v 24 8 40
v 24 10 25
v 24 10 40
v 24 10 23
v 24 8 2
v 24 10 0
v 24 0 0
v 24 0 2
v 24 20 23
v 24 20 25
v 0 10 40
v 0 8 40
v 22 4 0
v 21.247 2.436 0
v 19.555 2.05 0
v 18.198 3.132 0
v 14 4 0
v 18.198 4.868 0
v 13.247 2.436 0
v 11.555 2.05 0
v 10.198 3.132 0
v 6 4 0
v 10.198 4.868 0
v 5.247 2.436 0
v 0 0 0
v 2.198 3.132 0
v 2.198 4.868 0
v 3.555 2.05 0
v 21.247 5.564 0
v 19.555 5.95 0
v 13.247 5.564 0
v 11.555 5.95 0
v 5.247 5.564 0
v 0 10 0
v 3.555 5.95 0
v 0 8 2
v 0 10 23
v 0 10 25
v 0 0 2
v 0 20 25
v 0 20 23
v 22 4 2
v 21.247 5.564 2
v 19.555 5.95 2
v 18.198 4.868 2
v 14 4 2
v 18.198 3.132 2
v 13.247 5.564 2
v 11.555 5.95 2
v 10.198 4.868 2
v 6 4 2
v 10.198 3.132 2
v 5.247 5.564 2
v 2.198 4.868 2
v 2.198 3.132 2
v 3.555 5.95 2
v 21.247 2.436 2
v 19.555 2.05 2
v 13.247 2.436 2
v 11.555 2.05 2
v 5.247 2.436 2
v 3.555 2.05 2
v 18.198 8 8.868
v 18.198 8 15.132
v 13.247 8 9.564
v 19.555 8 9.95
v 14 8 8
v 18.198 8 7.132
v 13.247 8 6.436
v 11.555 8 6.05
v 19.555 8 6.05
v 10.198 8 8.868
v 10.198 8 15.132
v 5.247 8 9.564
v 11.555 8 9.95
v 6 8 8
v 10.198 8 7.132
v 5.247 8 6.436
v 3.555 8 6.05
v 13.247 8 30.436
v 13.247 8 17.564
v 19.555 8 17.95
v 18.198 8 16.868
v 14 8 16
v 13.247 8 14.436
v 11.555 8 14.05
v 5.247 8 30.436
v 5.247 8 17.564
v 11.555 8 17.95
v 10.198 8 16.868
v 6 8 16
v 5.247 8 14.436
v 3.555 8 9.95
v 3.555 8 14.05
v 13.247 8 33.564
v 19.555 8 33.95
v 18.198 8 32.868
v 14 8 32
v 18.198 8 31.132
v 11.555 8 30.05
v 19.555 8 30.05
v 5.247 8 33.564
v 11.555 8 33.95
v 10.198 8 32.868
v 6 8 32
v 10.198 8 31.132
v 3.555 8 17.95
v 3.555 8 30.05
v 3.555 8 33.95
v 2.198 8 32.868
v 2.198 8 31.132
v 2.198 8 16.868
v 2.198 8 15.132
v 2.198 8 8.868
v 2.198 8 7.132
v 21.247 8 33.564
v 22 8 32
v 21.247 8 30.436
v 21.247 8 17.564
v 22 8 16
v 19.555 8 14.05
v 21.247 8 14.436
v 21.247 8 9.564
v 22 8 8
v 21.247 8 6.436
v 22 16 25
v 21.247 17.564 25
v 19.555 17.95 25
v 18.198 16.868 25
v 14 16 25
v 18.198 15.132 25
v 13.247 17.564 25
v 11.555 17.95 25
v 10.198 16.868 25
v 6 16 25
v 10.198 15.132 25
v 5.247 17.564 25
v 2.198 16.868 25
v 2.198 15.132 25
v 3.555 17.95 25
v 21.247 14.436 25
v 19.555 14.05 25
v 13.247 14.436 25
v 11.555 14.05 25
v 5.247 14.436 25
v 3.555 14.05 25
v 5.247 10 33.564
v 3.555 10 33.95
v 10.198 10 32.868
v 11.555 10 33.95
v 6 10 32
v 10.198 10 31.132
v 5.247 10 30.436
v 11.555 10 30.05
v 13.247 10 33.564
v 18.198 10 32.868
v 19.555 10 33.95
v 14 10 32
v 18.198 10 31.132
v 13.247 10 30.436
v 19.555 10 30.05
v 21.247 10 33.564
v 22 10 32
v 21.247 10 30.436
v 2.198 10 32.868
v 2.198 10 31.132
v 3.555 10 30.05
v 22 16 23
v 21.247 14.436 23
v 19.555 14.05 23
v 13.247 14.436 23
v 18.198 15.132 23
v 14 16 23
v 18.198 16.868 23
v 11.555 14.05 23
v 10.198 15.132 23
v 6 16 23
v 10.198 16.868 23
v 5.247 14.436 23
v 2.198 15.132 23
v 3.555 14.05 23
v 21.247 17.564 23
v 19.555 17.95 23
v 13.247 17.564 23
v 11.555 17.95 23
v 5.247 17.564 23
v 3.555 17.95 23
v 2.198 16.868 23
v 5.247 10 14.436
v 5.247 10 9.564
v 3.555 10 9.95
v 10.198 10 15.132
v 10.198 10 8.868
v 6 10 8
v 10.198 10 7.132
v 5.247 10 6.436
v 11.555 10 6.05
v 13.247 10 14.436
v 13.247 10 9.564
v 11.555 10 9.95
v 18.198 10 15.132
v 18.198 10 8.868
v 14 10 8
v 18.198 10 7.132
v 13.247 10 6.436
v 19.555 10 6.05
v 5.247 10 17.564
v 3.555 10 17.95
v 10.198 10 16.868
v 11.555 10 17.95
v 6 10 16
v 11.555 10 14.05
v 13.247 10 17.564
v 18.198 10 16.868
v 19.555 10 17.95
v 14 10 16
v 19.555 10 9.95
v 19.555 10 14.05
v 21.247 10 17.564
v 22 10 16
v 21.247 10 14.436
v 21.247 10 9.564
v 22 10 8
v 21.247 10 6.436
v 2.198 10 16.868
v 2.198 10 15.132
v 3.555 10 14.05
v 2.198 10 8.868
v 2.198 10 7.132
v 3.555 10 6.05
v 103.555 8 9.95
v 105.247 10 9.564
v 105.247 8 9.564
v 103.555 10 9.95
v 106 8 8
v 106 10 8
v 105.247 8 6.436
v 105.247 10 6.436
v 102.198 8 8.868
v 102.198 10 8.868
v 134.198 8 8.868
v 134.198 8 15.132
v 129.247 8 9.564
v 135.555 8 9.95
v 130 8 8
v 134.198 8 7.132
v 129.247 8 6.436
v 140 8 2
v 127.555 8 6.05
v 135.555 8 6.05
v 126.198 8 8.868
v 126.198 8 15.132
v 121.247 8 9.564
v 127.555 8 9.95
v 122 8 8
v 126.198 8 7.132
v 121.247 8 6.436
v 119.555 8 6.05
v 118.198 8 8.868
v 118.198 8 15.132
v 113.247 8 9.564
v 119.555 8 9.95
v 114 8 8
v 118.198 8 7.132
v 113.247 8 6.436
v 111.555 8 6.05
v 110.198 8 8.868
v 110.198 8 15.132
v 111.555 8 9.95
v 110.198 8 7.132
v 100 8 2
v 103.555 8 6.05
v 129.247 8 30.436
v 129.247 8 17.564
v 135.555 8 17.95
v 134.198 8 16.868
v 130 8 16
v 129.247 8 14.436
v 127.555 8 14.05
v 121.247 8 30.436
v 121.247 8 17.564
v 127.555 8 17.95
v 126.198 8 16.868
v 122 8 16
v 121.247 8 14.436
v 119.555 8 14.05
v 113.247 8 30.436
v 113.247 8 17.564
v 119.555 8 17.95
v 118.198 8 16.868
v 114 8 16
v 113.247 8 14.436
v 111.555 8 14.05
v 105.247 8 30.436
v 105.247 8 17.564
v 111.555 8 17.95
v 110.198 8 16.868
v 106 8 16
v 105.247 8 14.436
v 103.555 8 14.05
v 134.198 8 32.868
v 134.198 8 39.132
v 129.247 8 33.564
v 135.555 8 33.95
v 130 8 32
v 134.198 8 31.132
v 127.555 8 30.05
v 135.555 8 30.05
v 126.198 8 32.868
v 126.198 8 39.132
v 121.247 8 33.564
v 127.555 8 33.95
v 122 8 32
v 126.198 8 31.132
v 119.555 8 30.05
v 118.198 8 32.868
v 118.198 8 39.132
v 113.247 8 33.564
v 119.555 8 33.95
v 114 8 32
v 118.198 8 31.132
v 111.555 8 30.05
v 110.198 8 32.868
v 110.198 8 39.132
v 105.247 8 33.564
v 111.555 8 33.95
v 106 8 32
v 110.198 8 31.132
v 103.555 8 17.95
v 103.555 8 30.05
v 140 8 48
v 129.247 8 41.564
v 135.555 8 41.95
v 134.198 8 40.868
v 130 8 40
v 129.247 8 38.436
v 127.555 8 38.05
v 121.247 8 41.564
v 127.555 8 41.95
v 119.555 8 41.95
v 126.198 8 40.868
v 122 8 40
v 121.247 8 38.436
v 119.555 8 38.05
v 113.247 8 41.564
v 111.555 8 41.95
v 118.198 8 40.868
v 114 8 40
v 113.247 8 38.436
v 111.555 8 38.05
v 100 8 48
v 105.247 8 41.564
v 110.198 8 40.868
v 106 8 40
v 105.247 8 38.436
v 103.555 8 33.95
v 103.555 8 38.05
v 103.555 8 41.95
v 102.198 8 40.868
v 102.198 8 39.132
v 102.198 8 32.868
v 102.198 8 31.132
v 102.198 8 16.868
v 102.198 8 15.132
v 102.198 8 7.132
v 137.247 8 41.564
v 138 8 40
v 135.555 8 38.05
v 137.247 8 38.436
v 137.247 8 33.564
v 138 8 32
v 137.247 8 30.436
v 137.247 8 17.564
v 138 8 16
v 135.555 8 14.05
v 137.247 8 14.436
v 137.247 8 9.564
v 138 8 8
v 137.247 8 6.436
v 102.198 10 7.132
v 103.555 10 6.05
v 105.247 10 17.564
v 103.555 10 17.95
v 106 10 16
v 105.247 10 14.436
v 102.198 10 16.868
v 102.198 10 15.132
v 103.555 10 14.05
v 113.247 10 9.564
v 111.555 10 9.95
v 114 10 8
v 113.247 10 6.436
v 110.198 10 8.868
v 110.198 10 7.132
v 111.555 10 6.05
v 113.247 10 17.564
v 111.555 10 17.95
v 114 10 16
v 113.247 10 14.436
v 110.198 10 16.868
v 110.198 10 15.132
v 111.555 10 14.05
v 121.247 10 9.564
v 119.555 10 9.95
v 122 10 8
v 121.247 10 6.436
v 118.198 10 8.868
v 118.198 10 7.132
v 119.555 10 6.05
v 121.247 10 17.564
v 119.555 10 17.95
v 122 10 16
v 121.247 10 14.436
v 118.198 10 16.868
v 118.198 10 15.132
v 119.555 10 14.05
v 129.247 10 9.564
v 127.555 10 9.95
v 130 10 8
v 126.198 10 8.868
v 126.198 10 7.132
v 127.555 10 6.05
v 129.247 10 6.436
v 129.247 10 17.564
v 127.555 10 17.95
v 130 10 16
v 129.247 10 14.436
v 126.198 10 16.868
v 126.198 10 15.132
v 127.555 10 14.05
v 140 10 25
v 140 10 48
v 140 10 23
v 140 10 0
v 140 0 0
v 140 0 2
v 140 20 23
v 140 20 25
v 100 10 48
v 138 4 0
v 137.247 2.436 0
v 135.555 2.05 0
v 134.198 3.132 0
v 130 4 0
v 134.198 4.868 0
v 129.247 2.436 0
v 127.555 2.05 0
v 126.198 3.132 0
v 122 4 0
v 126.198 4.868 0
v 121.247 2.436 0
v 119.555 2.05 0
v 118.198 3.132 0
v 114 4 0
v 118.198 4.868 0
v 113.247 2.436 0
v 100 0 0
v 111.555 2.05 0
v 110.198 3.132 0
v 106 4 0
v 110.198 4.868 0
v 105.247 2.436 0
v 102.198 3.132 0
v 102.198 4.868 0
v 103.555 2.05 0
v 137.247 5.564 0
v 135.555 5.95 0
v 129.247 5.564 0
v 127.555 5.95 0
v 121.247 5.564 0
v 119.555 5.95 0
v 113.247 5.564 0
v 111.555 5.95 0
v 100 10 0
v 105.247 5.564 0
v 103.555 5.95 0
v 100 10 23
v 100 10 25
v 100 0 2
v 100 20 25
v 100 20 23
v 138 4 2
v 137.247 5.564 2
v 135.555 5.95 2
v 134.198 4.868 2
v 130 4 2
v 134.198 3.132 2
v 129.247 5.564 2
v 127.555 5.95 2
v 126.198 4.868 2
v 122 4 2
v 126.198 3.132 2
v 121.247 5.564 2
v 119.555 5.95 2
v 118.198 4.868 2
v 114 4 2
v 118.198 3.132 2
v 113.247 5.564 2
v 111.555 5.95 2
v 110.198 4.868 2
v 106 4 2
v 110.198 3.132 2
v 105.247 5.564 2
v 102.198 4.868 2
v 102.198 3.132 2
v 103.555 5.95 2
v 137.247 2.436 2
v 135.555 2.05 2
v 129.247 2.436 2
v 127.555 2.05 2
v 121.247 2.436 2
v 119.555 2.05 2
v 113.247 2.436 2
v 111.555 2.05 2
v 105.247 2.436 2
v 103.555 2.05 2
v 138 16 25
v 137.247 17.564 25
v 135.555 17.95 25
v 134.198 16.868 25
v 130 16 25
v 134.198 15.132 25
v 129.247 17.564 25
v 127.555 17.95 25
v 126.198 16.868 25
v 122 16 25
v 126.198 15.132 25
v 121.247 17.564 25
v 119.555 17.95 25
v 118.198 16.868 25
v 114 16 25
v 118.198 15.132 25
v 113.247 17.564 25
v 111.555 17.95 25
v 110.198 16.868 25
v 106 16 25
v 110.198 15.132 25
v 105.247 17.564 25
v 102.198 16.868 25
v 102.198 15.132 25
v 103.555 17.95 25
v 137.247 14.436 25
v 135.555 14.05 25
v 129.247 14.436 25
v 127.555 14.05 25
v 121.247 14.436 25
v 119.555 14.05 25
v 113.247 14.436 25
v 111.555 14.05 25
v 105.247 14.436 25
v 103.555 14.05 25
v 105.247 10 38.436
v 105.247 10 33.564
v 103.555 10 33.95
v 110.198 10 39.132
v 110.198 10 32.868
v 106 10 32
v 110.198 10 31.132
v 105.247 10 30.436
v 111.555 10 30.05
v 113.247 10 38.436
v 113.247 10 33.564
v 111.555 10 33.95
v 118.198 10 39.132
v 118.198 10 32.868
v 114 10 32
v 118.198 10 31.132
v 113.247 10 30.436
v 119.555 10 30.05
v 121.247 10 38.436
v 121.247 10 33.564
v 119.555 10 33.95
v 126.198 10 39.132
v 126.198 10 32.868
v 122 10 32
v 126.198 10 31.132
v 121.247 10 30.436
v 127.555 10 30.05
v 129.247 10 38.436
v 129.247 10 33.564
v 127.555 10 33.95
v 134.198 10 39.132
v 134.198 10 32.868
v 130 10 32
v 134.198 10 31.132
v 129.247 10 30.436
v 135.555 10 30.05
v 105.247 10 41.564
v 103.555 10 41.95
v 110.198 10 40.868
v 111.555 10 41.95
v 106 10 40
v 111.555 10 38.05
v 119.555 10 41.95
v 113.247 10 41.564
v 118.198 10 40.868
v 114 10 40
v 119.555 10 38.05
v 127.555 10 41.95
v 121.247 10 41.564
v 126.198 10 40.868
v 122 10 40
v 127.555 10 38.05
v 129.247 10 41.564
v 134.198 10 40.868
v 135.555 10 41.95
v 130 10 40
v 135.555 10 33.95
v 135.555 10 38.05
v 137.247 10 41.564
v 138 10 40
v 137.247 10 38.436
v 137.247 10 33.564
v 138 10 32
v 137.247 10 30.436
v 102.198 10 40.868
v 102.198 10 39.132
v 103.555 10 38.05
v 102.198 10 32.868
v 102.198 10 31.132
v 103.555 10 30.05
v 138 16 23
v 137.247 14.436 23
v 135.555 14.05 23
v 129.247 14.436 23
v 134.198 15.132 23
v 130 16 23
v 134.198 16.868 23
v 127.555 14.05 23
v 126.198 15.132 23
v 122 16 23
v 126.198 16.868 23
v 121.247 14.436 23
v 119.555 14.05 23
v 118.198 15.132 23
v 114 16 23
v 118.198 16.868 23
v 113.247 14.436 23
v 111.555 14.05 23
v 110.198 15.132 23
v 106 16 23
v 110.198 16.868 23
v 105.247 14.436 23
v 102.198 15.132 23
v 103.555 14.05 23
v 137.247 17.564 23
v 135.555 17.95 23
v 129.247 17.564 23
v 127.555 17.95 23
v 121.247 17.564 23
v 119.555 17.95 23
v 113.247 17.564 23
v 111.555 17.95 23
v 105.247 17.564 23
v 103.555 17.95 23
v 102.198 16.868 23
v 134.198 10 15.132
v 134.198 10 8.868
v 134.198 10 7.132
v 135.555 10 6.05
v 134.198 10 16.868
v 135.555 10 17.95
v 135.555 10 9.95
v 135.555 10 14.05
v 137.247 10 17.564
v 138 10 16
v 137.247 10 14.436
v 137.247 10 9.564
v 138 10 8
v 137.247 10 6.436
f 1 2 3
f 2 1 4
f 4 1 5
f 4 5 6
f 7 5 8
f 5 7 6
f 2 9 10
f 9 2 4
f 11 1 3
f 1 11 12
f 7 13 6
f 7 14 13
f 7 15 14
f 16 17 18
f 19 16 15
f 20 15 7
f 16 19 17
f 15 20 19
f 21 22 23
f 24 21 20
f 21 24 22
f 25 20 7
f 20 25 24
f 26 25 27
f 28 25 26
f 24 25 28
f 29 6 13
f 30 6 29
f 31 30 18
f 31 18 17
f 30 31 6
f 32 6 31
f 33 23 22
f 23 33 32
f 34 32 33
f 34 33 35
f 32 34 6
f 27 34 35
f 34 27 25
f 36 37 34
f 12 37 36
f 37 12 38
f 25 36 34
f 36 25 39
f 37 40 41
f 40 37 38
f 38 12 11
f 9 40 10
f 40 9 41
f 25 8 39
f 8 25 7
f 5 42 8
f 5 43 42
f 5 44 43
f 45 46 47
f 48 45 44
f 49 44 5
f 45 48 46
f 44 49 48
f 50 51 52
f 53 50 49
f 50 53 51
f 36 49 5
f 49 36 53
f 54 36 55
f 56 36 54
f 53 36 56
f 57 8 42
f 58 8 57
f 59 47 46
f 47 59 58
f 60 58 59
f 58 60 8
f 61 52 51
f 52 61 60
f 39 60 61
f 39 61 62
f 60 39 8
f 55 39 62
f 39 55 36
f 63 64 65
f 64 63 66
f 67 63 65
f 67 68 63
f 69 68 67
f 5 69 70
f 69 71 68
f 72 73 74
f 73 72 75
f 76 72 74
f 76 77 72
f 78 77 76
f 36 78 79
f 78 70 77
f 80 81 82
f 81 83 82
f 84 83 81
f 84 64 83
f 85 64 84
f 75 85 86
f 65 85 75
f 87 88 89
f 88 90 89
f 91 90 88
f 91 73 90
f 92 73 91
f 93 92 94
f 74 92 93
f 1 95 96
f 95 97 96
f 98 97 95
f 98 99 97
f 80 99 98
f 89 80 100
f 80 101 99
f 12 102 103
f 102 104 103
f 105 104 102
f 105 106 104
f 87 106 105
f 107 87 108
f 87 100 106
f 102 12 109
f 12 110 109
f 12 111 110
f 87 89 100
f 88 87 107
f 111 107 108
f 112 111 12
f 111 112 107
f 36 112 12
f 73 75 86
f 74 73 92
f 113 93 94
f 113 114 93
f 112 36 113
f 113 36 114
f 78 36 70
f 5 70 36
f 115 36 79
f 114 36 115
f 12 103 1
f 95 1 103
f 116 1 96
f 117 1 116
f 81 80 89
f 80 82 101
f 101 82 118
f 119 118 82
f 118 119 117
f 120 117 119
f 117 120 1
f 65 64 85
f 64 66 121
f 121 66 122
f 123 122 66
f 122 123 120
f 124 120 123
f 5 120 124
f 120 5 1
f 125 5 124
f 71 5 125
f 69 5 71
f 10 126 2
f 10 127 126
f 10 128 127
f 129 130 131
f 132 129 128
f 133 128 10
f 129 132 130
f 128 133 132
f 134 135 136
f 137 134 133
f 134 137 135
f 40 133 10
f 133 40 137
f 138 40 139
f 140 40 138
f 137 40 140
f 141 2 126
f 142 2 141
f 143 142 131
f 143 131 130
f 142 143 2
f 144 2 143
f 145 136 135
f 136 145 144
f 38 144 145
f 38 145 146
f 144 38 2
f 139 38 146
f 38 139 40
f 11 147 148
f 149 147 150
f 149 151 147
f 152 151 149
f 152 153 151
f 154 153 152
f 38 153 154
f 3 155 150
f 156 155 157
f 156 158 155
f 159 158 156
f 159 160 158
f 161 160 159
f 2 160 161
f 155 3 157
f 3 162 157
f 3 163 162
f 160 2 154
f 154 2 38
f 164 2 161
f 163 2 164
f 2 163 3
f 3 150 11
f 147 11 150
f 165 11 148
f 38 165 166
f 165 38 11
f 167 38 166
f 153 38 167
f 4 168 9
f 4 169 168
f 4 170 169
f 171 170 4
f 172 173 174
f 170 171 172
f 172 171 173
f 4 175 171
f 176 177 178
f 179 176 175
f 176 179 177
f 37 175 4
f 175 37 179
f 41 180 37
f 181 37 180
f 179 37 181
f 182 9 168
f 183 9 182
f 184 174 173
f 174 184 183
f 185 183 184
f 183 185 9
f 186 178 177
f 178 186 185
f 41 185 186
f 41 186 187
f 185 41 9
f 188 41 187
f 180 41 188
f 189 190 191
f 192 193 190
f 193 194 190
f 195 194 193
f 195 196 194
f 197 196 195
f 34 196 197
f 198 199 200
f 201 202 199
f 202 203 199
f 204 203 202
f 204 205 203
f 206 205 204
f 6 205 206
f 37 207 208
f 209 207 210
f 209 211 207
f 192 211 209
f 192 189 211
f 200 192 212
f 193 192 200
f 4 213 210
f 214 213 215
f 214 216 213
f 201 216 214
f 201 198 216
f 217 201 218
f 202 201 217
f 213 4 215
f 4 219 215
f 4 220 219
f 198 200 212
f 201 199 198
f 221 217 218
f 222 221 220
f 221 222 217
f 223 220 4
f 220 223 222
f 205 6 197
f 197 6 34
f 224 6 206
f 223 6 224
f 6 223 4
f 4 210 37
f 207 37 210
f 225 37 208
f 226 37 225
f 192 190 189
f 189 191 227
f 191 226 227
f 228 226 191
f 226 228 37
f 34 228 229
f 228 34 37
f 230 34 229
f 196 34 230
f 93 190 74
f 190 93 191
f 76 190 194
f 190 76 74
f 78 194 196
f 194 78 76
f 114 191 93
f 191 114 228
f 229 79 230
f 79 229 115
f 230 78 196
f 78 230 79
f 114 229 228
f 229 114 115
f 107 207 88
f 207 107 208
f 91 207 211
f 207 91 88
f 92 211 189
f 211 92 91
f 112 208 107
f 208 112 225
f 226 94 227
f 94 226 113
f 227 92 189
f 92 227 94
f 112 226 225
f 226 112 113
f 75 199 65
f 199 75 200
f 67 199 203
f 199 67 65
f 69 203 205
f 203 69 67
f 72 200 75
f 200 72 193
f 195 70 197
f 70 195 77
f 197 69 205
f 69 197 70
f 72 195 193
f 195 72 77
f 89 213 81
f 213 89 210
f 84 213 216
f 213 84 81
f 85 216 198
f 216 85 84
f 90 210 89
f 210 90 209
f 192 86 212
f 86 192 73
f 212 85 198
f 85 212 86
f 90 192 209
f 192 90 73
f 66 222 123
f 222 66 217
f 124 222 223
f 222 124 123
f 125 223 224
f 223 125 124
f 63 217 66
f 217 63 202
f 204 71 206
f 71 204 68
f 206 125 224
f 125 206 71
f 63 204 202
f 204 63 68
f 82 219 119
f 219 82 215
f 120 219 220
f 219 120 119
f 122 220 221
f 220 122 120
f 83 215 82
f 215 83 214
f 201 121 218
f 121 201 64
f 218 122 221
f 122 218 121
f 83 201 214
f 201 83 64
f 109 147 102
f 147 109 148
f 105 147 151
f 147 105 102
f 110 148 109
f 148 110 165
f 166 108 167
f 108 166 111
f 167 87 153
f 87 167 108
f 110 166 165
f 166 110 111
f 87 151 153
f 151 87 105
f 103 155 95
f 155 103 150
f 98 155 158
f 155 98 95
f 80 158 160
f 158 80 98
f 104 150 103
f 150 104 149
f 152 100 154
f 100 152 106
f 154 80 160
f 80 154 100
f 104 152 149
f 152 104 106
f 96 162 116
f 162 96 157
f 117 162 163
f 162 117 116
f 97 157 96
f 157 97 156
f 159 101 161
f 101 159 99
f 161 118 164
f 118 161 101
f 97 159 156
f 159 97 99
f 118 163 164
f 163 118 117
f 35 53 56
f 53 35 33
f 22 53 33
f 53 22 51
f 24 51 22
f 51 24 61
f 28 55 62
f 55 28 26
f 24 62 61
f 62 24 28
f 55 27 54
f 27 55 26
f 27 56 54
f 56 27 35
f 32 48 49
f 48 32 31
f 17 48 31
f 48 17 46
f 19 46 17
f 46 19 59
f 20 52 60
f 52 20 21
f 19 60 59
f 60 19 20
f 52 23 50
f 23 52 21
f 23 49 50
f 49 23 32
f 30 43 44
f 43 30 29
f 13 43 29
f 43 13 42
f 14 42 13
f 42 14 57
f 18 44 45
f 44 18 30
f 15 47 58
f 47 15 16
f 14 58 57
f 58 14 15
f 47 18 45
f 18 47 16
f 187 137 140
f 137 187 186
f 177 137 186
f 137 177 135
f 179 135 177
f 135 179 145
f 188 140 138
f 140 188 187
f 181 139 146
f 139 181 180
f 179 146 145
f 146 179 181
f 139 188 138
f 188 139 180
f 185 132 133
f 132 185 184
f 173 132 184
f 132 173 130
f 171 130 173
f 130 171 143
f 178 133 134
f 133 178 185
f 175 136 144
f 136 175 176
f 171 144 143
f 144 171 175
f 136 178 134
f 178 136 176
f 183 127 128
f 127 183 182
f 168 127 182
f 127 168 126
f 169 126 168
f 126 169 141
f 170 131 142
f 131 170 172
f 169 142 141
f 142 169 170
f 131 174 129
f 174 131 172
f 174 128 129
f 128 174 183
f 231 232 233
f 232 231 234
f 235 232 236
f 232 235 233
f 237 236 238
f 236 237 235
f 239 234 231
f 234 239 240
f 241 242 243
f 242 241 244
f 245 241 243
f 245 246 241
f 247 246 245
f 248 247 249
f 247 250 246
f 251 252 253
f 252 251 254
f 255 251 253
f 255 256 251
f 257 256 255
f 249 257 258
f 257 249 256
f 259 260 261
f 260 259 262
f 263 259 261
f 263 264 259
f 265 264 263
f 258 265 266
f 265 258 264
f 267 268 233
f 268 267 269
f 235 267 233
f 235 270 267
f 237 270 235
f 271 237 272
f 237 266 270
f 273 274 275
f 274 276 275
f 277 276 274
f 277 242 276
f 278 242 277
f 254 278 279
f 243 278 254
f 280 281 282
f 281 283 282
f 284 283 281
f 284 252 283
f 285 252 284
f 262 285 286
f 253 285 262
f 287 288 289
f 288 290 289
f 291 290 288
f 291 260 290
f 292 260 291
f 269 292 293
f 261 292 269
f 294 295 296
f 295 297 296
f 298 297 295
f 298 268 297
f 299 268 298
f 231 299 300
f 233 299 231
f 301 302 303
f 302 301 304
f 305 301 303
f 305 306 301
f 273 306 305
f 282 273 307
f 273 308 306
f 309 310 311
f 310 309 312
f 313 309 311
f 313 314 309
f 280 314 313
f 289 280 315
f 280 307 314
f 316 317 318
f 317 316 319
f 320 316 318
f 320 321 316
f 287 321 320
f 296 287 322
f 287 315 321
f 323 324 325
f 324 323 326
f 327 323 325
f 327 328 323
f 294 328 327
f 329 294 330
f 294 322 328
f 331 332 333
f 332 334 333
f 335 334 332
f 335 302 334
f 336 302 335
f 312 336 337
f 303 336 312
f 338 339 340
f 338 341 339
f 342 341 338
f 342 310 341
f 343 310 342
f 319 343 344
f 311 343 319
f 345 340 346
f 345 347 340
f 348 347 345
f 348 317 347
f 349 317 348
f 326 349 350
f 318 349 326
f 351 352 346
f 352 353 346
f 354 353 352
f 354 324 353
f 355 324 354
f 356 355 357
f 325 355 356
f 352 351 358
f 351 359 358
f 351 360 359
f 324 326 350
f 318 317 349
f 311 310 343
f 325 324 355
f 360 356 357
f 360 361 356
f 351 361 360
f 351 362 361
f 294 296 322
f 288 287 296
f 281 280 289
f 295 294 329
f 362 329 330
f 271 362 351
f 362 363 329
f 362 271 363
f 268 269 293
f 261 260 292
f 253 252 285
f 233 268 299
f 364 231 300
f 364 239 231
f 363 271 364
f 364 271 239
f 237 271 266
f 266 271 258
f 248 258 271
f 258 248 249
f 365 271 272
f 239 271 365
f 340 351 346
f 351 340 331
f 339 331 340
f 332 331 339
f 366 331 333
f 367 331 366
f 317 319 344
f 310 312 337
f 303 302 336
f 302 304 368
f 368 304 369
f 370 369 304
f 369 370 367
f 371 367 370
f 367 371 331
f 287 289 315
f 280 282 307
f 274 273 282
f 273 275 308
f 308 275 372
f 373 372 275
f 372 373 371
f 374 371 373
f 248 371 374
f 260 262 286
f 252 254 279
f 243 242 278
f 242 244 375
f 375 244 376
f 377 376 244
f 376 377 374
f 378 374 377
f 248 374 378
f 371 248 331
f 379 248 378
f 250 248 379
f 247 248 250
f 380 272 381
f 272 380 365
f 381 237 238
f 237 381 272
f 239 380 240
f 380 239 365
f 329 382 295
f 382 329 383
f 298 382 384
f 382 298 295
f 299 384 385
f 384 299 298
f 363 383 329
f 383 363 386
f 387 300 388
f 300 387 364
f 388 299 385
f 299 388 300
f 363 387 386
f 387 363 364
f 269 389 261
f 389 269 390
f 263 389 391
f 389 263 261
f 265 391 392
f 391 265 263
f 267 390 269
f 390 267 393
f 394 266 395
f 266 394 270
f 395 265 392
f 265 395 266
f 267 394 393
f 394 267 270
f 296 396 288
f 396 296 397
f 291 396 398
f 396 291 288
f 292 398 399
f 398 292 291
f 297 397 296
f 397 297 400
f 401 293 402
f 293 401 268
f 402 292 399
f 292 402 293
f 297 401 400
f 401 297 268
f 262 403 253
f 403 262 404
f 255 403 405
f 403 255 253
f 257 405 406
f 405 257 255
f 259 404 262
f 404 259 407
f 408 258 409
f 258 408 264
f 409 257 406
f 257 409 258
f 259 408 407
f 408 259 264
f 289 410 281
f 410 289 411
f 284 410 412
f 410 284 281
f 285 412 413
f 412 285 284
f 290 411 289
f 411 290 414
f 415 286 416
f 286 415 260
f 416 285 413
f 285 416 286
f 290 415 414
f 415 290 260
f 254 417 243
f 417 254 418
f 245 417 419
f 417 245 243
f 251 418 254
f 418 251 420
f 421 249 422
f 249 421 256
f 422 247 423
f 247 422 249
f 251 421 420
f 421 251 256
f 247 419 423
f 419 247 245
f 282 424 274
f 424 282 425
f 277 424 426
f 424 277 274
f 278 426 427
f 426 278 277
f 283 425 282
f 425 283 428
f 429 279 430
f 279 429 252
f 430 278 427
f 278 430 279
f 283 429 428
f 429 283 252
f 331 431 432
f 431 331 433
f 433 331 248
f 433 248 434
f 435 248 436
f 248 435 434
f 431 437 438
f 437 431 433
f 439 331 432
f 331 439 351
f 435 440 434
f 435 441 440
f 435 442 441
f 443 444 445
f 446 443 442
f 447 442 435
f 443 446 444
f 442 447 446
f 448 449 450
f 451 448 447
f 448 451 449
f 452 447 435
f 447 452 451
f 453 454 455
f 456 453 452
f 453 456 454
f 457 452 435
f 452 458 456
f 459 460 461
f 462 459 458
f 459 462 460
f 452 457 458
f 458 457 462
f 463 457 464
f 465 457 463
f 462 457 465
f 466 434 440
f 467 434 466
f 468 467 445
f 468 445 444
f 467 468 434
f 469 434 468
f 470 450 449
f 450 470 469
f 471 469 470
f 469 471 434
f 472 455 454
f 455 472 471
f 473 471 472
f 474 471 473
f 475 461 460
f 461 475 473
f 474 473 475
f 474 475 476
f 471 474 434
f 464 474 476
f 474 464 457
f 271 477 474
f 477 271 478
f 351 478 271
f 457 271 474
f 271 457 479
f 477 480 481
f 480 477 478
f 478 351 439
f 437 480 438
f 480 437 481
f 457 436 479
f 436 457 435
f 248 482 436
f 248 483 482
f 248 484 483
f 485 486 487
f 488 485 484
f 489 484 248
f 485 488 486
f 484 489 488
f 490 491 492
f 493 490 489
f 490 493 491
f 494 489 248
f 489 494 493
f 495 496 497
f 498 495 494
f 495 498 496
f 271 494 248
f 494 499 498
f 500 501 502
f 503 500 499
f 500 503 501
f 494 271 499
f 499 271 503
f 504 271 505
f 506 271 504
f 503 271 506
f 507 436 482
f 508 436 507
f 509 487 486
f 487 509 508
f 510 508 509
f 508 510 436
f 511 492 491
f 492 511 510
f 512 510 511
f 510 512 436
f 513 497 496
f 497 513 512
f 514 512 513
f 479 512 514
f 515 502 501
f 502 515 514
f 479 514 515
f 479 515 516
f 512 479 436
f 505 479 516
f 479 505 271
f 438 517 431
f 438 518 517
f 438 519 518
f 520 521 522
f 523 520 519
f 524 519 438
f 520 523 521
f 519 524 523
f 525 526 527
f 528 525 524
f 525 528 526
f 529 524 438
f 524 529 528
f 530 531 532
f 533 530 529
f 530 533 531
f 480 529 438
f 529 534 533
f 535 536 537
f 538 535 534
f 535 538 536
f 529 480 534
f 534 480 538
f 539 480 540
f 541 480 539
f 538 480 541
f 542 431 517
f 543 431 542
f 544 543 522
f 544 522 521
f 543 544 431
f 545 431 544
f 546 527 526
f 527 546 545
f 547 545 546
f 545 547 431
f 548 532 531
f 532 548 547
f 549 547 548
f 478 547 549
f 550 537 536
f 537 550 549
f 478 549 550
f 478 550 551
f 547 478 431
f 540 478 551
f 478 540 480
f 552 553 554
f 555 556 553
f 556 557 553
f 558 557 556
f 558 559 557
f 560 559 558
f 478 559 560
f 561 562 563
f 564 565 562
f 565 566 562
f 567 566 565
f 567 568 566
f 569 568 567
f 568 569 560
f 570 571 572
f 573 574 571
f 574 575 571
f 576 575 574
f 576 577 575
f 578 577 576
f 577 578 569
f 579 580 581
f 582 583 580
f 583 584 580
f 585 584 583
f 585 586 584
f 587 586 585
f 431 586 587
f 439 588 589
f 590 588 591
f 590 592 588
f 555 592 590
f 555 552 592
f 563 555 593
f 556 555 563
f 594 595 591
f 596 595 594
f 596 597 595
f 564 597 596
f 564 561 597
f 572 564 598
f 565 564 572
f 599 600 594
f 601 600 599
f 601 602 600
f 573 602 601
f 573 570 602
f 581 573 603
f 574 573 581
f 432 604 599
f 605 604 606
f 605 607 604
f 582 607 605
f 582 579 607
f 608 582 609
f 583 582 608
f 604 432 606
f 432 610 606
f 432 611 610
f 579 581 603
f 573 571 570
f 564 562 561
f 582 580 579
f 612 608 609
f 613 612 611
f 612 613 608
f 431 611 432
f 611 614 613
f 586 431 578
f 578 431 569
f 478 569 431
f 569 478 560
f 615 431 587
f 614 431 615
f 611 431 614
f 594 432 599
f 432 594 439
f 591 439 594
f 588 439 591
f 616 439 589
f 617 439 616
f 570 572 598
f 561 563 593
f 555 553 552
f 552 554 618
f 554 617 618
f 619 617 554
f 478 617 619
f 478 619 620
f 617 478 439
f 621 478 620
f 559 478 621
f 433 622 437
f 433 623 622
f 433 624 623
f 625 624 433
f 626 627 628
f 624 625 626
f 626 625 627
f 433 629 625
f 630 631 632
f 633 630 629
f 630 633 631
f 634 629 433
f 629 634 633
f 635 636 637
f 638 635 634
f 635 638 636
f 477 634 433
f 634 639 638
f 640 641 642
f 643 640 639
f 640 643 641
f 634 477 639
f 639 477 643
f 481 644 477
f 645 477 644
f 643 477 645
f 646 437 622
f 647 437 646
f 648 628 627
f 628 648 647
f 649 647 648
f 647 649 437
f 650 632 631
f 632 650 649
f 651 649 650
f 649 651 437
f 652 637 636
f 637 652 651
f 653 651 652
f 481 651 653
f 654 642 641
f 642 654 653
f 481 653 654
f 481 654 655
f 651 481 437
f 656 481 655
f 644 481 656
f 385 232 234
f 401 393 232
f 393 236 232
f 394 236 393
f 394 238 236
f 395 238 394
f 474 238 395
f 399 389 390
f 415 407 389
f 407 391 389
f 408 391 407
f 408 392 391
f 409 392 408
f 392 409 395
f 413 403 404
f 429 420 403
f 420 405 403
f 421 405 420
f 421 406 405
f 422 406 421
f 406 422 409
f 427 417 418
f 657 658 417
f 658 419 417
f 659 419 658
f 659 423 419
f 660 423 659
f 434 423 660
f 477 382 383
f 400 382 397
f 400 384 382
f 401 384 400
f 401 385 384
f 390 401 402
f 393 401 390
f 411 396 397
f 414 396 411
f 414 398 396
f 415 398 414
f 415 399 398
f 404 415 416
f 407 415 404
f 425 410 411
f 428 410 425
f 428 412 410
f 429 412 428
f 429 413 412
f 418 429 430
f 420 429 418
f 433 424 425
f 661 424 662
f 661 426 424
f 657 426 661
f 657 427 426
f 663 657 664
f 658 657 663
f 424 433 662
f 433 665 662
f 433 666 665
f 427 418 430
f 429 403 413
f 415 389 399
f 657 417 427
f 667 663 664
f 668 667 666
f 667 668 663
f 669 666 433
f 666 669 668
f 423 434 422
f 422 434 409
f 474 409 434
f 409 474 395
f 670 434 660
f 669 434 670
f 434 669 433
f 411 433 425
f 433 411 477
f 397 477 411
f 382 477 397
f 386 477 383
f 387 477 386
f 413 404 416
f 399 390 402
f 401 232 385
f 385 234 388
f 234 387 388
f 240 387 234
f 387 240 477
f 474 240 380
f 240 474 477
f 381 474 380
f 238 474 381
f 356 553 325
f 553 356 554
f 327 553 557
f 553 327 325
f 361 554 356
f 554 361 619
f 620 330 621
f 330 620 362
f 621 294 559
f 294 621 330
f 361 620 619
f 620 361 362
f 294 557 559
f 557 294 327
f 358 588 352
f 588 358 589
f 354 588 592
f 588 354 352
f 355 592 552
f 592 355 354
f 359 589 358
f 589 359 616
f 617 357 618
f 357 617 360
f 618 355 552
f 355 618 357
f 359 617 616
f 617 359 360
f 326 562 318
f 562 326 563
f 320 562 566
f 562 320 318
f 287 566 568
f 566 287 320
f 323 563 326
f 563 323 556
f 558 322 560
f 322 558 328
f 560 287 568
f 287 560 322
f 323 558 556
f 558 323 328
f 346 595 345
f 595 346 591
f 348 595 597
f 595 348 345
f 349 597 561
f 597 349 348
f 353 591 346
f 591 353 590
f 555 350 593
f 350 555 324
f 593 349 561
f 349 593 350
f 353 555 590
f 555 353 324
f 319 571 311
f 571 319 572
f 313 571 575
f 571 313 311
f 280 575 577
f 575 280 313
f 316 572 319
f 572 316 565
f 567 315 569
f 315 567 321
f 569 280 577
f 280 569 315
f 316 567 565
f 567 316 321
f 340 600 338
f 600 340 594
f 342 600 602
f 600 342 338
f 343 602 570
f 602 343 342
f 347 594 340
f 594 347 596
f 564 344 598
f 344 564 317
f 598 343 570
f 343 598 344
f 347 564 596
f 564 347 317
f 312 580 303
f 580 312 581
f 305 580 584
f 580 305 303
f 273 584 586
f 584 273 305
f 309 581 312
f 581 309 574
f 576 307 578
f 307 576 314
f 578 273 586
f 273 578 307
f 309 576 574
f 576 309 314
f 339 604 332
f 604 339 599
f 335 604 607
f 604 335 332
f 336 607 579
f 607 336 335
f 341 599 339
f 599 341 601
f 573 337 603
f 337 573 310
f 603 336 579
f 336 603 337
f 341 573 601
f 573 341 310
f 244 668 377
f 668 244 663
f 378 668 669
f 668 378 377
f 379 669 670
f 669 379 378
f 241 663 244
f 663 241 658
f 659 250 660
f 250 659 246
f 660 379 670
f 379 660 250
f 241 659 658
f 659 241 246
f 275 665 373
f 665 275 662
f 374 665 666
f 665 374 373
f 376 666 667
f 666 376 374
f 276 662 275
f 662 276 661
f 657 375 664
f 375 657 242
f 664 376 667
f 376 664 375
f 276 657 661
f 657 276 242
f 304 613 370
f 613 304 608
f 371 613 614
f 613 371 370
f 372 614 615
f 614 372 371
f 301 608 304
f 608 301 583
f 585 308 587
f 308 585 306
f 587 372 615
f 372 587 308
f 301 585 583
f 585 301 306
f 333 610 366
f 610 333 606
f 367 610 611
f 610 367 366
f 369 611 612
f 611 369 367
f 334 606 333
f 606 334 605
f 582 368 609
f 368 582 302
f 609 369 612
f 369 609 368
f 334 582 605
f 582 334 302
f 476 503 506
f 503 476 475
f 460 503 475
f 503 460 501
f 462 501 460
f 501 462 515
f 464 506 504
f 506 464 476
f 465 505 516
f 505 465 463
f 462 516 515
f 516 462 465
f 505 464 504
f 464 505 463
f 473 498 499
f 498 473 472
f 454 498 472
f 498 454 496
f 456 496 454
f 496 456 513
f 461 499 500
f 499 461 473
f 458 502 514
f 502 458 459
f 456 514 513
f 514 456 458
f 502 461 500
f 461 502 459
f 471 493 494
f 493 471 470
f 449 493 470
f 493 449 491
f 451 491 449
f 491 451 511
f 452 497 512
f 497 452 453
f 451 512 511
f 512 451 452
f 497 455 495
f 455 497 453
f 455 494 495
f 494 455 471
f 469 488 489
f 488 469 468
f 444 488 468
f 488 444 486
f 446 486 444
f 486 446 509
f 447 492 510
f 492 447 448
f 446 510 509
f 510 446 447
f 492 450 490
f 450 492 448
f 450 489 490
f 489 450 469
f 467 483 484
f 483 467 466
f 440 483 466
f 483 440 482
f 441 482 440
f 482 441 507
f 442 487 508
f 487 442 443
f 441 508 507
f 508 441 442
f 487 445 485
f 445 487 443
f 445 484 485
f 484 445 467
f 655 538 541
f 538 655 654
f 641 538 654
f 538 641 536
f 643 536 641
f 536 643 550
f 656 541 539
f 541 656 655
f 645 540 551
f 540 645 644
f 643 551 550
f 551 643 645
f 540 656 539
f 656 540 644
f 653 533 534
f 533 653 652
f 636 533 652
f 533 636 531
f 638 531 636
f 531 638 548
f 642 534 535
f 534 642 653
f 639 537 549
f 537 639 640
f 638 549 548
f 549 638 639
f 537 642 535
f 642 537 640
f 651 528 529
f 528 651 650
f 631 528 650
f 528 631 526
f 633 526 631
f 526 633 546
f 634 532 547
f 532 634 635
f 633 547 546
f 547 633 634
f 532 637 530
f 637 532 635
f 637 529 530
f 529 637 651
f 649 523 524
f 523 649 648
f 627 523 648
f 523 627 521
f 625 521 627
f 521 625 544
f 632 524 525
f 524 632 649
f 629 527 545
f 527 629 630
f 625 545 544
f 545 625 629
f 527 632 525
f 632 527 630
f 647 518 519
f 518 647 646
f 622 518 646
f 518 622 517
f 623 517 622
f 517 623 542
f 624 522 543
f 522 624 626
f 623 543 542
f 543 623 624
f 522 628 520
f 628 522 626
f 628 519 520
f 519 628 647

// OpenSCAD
// file: wall.scad
module wall(largeur=3, hauteur=5, epaisseur=2){
difference(){
difference(){
    cube([largeur*8, 20, hauteur*8]);
    translate([-1,-1,epaisseur]){
        cube([largeur*8+2, 8+1, hauteur*8]);
    };
    translate([-1,8+epaisseur,24+epaisseur/2]){
        cube([largeur*8+2, 8+epaisseur+2, 24+epaisseur/2]);
    };
    translate([-1,8+epaisseur,-1]){
        cube([largeur*8+2, 8+epaisseur+2, 24-epaisseur/2+1]);
    };
};


union(){
for(i=[0:largeur]){
    for(j=[0:1]){
      
        translate([4+i*8, 12, 8+j*8]){
            rotate([90,0,0]){
            cylinder(h=4, r= 2);
            }
        }
    };
    for(j=[3:hauteur-2]){
      
        translate([4+i*8, 12, 8+j*8]){
            rotate([90,0,0]){
            cylinder(h=4, r= 2);
            }
        }
    }
    
    
    }
};
union(){
    for(i=[0:largeur]){
        translate([4+i*8, 4, 0]){
            cylinder(h=4, r=2);
            }
    }
};

union(){
    for(i=[0:largeur]){
        translate([4+i*8, 16, 0]){
            cylinder(h=32, r=2);
            }
    }
};

}
}
// main file
use <wall.scad>;

wall(3, 5, 2);

translate([100,0,0])
    wall(5, 6, 2);
